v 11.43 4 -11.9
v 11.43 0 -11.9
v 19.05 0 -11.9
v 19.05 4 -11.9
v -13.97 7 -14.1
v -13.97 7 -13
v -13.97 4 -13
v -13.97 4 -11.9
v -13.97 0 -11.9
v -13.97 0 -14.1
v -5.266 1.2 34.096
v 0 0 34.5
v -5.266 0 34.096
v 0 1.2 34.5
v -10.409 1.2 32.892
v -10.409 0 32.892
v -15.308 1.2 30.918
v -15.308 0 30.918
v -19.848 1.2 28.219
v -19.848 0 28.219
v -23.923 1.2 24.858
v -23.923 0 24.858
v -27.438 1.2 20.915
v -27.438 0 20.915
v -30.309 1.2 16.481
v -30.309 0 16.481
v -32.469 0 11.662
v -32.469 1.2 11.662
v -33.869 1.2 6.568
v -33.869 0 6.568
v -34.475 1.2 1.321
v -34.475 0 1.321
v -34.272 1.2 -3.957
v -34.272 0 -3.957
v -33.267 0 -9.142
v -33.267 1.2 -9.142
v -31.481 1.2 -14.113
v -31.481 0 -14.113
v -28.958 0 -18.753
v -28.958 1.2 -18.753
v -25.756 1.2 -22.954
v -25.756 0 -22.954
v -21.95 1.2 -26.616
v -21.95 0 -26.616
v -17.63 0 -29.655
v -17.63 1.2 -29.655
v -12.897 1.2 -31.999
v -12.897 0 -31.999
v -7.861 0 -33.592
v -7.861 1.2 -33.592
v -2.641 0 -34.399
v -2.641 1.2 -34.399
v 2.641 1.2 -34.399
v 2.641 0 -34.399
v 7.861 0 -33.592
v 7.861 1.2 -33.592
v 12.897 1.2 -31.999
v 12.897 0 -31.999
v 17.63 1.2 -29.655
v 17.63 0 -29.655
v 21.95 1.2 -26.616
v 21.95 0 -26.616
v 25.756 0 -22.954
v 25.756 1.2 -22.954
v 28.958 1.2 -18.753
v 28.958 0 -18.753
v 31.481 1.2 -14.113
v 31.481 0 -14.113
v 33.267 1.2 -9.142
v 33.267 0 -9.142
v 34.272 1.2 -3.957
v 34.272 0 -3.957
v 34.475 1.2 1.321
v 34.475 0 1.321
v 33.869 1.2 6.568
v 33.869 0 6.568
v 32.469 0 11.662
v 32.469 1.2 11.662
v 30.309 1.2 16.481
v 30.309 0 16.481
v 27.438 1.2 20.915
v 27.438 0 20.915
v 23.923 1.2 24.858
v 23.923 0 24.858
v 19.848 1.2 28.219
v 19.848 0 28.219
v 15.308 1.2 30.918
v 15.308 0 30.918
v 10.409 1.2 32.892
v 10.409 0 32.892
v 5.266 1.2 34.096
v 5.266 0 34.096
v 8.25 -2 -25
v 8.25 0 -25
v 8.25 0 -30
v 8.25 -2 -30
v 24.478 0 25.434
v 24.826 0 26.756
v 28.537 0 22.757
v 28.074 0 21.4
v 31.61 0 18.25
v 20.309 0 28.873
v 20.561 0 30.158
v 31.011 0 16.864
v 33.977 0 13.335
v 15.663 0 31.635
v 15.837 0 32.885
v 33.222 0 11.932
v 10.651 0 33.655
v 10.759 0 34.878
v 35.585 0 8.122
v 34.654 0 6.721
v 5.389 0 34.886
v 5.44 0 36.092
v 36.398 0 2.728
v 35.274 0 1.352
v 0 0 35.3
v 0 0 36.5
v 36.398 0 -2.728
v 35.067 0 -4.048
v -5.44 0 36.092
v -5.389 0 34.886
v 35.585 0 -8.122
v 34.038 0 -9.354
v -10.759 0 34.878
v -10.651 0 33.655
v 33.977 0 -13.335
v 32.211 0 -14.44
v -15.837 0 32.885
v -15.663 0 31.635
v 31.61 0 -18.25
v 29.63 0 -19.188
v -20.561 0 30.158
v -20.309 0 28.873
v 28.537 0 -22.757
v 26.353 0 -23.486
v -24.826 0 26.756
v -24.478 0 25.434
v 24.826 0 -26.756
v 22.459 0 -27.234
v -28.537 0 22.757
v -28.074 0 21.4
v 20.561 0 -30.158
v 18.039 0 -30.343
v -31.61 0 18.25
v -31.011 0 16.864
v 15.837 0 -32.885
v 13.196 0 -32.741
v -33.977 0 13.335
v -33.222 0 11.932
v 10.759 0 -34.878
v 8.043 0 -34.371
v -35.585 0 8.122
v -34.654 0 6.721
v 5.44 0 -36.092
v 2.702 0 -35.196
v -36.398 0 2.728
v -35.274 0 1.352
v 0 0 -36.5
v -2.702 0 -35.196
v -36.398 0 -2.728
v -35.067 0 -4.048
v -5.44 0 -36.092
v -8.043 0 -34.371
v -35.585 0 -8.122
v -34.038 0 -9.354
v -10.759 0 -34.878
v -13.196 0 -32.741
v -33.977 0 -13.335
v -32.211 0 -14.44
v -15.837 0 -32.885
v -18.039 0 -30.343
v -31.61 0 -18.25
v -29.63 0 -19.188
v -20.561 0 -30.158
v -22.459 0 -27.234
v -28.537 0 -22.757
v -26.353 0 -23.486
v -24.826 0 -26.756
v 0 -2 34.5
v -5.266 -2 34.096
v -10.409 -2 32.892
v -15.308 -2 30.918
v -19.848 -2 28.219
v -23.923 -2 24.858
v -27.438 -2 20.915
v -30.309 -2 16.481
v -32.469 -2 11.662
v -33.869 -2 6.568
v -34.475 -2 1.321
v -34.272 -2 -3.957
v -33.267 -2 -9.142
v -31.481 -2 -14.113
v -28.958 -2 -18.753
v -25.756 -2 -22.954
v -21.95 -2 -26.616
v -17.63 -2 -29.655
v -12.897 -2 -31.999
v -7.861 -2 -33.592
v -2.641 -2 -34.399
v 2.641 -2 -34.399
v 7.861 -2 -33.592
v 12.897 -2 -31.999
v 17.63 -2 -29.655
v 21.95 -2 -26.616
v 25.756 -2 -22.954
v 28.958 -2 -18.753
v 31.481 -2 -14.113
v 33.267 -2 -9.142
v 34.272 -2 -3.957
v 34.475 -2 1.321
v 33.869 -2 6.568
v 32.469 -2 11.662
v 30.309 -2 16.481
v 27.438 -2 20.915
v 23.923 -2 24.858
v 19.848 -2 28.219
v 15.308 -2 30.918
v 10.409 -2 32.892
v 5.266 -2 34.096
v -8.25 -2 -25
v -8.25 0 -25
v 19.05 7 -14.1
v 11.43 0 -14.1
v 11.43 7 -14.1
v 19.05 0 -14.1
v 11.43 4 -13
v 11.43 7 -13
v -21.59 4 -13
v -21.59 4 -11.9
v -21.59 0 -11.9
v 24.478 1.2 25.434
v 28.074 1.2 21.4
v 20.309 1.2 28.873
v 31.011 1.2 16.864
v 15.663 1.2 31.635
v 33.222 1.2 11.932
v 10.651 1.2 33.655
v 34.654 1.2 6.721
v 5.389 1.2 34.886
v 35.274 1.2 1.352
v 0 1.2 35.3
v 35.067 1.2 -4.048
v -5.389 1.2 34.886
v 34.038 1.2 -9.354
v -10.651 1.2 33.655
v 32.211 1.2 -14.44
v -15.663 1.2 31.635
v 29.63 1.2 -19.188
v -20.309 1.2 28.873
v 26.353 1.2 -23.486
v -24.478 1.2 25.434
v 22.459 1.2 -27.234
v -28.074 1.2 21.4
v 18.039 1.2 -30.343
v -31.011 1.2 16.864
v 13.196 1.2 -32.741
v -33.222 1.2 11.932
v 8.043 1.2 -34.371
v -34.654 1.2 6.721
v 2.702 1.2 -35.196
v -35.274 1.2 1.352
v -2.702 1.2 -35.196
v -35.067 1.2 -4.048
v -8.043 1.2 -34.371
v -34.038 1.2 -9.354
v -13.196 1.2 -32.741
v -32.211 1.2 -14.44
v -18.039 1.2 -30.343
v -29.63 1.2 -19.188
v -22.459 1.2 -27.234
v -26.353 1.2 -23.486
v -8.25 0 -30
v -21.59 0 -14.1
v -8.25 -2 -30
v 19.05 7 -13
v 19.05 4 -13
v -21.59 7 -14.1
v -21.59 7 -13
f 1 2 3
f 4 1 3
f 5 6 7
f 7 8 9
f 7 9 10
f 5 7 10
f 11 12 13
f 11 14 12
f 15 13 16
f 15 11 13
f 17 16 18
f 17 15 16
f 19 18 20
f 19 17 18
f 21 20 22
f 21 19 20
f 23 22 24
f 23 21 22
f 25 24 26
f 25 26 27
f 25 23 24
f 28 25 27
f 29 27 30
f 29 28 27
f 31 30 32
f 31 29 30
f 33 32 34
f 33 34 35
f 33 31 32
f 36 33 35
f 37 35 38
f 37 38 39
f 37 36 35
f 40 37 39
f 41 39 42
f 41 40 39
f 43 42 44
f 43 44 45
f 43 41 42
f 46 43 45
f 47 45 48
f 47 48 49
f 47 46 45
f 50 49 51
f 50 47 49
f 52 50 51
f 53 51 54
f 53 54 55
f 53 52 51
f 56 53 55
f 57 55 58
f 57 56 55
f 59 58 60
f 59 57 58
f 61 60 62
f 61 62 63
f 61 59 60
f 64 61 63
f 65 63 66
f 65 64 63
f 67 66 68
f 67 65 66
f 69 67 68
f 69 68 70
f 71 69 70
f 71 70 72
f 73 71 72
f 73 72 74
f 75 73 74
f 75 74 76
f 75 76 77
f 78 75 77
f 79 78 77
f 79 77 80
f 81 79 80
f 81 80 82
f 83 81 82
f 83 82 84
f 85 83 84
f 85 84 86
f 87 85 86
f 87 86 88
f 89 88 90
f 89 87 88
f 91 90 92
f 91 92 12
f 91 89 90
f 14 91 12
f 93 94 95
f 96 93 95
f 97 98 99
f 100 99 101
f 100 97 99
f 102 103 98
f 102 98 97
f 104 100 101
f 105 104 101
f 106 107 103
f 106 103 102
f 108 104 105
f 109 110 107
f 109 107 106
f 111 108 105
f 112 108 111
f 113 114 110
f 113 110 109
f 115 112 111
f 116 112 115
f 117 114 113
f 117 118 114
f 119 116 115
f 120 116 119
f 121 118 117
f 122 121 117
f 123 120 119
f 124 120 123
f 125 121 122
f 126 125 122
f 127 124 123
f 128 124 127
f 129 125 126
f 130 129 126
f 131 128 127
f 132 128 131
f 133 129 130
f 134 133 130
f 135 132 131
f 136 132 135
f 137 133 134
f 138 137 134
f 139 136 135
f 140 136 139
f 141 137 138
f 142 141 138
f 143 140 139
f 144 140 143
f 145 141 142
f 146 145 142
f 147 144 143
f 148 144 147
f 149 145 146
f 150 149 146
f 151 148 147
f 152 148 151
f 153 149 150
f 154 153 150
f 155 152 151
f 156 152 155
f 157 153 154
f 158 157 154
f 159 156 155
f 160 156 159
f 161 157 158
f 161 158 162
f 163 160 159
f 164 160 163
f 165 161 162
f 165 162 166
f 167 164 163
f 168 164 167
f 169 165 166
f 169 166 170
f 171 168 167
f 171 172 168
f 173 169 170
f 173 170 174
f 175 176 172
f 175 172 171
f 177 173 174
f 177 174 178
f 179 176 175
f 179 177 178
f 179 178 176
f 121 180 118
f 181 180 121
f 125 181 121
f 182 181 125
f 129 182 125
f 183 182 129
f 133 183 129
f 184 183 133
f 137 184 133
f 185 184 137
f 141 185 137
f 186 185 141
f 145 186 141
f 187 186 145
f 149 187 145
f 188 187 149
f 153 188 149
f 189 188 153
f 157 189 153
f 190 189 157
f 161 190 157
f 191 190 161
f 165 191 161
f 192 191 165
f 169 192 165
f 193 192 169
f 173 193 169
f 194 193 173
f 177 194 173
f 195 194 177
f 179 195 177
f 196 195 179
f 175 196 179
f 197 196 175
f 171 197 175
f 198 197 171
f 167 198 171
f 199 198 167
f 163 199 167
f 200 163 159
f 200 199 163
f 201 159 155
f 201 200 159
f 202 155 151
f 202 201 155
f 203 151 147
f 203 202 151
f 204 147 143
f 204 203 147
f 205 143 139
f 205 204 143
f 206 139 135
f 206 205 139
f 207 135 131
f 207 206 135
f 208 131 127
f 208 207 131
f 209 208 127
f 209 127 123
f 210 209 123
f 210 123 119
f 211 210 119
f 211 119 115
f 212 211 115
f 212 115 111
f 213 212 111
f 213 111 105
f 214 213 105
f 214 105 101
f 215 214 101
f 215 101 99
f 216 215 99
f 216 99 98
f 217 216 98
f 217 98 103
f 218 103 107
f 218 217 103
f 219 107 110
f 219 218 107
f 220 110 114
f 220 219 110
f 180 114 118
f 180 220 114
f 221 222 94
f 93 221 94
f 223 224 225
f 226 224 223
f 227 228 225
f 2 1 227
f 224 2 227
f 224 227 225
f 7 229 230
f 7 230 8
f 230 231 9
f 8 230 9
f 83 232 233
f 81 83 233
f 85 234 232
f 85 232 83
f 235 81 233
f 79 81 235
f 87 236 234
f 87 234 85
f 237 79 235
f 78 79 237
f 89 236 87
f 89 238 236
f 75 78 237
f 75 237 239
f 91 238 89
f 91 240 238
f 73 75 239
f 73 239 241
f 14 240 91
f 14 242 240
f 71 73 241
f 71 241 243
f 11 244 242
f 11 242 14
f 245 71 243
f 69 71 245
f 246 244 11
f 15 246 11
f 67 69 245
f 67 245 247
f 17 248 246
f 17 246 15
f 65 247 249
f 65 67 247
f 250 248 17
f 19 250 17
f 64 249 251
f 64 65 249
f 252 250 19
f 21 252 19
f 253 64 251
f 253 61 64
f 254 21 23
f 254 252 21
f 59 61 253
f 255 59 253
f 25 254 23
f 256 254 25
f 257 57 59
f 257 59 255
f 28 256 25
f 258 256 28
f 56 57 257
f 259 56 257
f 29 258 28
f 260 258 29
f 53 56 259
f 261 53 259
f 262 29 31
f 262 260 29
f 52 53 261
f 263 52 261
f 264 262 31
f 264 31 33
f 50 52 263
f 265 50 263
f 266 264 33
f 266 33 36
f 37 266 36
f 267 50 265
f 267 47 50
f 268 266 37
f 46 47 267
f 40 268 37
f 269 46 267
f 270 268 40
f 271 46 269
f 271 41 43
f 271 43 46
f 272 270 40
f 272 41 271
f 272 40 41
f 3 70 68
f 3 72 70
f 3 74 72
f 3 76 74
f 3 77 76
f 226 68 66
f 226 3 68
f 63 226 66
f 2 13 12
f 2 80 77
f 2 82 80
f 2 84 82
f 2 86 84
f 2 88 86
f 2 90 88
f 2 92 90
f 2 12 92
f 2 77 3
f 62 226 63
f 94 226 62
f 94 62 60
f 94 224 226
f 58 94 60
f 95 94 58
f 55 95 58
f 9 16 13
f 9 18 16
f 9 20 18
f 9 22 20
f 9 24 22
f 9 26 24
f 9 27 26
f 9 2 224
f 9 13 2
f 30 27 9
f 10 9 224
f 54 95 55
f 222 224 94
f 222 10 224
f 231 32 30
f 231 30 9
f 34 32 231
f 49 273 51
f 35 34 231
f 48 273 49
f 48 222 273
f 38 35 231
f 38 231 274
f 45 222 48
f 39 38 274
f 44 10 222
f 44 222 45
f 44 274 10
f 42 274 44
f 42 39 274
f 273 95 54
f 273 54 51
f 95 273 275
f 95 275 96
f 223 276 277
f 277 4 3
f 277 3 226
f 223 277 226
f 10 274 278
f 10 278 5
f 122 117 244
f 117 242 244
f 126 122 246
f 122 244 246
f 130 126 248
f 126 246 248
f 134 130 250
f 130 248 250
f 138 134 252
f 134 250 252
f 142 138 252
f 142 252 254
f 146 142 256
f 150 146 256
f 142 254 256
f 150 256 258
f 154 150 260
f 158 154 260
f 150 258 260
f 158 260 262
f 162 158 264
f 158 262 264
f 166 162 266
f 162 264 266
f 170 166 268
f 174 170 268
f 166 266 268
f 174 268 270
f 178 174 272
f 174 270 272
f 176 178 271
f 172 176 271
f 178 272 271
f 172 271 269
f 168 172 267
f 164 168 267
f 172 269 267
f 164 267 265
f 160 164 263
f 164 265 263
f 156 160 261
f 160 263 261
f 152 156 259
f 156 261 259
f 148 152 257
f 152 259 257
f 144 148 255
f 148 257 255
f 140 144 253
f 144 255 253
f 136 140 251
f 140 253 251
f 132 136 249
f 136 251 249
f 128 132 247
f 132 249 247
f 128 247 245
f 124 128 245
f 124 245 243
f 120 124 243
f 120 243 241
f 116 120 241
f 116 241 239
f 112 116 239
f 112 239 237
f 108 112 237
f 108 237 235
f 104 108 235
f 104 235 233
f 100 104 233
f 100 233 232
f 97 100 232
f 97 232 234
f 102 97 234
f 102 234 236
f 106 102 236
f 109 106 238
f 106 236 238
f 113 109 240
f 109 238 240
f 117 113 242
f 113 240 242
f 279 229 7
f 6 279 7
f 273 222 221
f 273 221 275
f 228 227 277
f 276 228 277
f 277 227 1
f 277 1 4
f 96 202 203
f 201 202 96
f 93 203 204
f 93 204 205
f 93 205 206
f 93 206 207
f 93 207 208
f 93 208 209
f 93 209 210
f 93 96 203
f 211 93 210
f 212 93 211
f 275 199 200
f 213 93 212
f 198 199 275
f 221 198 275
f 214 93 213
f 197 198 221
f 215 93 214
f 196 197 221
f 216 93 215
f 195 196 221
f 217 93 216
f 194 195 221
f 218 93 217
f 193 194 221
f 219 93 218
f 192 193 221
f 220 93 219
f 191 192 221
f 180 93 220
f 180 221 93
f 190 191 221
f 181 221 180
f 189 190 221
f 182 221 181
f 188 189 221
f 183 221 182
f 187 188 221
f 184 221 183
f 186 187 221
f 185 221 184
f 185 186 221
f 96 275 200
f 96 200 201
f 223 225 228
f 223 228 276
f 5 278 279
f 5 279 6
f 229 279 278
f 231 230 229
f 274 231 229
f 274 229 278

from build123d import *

# Parameters (mm, degrees)
SKETCH2_W           = 0.8
SKETCH2_H           = 1.2
CUT_EXTRUDE2_REACH  = 53.658
SKETCH3_W           = 16.5
SKETCH3_H           = 5
SKETCH4_W           = 7.62
SKETCH4_H           = 2.2
BOSS_EXTRUDE1_DEPTH = 4
SKETCH5_W           = 7.62
SKETCH5_H           = 1.1
BOSS_EXTRUDE2_DEPTH = 3


with BuildPart() as part:
    # Sketch2 → Revolve1 (revolve)
    with BuildSketch(Plane.XY, mode=Mode.PRIVATE) as revolve1_sk:
        Polygon((0, -2), (0, 0), (36.5, 0), (34.5, -2), align=None)
        with Locations((34.9, 0.6)):
            Rectangle(SKETCH2_W, SKETCH2_H)
    revolve(revolve1_sk.sketch.rotate(Axis((0, 31.706596317, 0), (0, -1, 0)), 90), axis=Axis((0, 31.706596317, 0), (0, -1, 0)))

    # Sketch3 → Cut-Extrude2 (cut, up to next)
    with BuildSketch(Plane(origin=(0, 0, 0), x_dir=(1, 0, 0), z_dir=(0, 1, 0)), mode=Mode.PRIVATE) as cut_extrude2_sk1:
        with Locations((0, 27.5)):
            Rectangle(SKETCH3_W, SKETCH3_H)
    cut_extrude2_tool1 = extrude(cut_extrude2_sk1.sketch, amount=-CUT_EXTRUDE2_REACH, mode=Mode.PRIVATE) & part.part
    add(cut_extrude2_tool1.solids().sort_by_distance((0, 0, -27.5))[0], mode=Mode.SUBTRACT)

    # Sketch4 → Boss-Extrude1 (add)
    with BuildSketch(Plane(origin=(0, 0, 0), x_dir=(1, 0, 0), z_dir=(0, 1, 0))):
        with Locations((-17.78, 13)):
            Rectangle(SKETCH4_W, SKETCH4_H)
        with Locations((15.24, 13)):
            Rectangle(SKETCH4_W, SKETCH4_H)
    extrude(amount=BOSS_EXTRUDE1_DEPTH)

    # Sketch5 → Boss-Extrude2 (add)
    with BuildSketch(Plane(origin=(0, 4, 0), x_dir=(1, 0, 0), z_dir=(0, 1, 0))):
        with Locations((-17.78, 13.55)):
            Rectangle(SKETCH5_W, SKETCH5_H)
        with Locations((15.24, 13.55)):
            Rectangle(SKETCH5_W, SKETCH5_H)
    extrude(amount=BOSS_EXTRUDE2_DEPTH)


solid = part.part
